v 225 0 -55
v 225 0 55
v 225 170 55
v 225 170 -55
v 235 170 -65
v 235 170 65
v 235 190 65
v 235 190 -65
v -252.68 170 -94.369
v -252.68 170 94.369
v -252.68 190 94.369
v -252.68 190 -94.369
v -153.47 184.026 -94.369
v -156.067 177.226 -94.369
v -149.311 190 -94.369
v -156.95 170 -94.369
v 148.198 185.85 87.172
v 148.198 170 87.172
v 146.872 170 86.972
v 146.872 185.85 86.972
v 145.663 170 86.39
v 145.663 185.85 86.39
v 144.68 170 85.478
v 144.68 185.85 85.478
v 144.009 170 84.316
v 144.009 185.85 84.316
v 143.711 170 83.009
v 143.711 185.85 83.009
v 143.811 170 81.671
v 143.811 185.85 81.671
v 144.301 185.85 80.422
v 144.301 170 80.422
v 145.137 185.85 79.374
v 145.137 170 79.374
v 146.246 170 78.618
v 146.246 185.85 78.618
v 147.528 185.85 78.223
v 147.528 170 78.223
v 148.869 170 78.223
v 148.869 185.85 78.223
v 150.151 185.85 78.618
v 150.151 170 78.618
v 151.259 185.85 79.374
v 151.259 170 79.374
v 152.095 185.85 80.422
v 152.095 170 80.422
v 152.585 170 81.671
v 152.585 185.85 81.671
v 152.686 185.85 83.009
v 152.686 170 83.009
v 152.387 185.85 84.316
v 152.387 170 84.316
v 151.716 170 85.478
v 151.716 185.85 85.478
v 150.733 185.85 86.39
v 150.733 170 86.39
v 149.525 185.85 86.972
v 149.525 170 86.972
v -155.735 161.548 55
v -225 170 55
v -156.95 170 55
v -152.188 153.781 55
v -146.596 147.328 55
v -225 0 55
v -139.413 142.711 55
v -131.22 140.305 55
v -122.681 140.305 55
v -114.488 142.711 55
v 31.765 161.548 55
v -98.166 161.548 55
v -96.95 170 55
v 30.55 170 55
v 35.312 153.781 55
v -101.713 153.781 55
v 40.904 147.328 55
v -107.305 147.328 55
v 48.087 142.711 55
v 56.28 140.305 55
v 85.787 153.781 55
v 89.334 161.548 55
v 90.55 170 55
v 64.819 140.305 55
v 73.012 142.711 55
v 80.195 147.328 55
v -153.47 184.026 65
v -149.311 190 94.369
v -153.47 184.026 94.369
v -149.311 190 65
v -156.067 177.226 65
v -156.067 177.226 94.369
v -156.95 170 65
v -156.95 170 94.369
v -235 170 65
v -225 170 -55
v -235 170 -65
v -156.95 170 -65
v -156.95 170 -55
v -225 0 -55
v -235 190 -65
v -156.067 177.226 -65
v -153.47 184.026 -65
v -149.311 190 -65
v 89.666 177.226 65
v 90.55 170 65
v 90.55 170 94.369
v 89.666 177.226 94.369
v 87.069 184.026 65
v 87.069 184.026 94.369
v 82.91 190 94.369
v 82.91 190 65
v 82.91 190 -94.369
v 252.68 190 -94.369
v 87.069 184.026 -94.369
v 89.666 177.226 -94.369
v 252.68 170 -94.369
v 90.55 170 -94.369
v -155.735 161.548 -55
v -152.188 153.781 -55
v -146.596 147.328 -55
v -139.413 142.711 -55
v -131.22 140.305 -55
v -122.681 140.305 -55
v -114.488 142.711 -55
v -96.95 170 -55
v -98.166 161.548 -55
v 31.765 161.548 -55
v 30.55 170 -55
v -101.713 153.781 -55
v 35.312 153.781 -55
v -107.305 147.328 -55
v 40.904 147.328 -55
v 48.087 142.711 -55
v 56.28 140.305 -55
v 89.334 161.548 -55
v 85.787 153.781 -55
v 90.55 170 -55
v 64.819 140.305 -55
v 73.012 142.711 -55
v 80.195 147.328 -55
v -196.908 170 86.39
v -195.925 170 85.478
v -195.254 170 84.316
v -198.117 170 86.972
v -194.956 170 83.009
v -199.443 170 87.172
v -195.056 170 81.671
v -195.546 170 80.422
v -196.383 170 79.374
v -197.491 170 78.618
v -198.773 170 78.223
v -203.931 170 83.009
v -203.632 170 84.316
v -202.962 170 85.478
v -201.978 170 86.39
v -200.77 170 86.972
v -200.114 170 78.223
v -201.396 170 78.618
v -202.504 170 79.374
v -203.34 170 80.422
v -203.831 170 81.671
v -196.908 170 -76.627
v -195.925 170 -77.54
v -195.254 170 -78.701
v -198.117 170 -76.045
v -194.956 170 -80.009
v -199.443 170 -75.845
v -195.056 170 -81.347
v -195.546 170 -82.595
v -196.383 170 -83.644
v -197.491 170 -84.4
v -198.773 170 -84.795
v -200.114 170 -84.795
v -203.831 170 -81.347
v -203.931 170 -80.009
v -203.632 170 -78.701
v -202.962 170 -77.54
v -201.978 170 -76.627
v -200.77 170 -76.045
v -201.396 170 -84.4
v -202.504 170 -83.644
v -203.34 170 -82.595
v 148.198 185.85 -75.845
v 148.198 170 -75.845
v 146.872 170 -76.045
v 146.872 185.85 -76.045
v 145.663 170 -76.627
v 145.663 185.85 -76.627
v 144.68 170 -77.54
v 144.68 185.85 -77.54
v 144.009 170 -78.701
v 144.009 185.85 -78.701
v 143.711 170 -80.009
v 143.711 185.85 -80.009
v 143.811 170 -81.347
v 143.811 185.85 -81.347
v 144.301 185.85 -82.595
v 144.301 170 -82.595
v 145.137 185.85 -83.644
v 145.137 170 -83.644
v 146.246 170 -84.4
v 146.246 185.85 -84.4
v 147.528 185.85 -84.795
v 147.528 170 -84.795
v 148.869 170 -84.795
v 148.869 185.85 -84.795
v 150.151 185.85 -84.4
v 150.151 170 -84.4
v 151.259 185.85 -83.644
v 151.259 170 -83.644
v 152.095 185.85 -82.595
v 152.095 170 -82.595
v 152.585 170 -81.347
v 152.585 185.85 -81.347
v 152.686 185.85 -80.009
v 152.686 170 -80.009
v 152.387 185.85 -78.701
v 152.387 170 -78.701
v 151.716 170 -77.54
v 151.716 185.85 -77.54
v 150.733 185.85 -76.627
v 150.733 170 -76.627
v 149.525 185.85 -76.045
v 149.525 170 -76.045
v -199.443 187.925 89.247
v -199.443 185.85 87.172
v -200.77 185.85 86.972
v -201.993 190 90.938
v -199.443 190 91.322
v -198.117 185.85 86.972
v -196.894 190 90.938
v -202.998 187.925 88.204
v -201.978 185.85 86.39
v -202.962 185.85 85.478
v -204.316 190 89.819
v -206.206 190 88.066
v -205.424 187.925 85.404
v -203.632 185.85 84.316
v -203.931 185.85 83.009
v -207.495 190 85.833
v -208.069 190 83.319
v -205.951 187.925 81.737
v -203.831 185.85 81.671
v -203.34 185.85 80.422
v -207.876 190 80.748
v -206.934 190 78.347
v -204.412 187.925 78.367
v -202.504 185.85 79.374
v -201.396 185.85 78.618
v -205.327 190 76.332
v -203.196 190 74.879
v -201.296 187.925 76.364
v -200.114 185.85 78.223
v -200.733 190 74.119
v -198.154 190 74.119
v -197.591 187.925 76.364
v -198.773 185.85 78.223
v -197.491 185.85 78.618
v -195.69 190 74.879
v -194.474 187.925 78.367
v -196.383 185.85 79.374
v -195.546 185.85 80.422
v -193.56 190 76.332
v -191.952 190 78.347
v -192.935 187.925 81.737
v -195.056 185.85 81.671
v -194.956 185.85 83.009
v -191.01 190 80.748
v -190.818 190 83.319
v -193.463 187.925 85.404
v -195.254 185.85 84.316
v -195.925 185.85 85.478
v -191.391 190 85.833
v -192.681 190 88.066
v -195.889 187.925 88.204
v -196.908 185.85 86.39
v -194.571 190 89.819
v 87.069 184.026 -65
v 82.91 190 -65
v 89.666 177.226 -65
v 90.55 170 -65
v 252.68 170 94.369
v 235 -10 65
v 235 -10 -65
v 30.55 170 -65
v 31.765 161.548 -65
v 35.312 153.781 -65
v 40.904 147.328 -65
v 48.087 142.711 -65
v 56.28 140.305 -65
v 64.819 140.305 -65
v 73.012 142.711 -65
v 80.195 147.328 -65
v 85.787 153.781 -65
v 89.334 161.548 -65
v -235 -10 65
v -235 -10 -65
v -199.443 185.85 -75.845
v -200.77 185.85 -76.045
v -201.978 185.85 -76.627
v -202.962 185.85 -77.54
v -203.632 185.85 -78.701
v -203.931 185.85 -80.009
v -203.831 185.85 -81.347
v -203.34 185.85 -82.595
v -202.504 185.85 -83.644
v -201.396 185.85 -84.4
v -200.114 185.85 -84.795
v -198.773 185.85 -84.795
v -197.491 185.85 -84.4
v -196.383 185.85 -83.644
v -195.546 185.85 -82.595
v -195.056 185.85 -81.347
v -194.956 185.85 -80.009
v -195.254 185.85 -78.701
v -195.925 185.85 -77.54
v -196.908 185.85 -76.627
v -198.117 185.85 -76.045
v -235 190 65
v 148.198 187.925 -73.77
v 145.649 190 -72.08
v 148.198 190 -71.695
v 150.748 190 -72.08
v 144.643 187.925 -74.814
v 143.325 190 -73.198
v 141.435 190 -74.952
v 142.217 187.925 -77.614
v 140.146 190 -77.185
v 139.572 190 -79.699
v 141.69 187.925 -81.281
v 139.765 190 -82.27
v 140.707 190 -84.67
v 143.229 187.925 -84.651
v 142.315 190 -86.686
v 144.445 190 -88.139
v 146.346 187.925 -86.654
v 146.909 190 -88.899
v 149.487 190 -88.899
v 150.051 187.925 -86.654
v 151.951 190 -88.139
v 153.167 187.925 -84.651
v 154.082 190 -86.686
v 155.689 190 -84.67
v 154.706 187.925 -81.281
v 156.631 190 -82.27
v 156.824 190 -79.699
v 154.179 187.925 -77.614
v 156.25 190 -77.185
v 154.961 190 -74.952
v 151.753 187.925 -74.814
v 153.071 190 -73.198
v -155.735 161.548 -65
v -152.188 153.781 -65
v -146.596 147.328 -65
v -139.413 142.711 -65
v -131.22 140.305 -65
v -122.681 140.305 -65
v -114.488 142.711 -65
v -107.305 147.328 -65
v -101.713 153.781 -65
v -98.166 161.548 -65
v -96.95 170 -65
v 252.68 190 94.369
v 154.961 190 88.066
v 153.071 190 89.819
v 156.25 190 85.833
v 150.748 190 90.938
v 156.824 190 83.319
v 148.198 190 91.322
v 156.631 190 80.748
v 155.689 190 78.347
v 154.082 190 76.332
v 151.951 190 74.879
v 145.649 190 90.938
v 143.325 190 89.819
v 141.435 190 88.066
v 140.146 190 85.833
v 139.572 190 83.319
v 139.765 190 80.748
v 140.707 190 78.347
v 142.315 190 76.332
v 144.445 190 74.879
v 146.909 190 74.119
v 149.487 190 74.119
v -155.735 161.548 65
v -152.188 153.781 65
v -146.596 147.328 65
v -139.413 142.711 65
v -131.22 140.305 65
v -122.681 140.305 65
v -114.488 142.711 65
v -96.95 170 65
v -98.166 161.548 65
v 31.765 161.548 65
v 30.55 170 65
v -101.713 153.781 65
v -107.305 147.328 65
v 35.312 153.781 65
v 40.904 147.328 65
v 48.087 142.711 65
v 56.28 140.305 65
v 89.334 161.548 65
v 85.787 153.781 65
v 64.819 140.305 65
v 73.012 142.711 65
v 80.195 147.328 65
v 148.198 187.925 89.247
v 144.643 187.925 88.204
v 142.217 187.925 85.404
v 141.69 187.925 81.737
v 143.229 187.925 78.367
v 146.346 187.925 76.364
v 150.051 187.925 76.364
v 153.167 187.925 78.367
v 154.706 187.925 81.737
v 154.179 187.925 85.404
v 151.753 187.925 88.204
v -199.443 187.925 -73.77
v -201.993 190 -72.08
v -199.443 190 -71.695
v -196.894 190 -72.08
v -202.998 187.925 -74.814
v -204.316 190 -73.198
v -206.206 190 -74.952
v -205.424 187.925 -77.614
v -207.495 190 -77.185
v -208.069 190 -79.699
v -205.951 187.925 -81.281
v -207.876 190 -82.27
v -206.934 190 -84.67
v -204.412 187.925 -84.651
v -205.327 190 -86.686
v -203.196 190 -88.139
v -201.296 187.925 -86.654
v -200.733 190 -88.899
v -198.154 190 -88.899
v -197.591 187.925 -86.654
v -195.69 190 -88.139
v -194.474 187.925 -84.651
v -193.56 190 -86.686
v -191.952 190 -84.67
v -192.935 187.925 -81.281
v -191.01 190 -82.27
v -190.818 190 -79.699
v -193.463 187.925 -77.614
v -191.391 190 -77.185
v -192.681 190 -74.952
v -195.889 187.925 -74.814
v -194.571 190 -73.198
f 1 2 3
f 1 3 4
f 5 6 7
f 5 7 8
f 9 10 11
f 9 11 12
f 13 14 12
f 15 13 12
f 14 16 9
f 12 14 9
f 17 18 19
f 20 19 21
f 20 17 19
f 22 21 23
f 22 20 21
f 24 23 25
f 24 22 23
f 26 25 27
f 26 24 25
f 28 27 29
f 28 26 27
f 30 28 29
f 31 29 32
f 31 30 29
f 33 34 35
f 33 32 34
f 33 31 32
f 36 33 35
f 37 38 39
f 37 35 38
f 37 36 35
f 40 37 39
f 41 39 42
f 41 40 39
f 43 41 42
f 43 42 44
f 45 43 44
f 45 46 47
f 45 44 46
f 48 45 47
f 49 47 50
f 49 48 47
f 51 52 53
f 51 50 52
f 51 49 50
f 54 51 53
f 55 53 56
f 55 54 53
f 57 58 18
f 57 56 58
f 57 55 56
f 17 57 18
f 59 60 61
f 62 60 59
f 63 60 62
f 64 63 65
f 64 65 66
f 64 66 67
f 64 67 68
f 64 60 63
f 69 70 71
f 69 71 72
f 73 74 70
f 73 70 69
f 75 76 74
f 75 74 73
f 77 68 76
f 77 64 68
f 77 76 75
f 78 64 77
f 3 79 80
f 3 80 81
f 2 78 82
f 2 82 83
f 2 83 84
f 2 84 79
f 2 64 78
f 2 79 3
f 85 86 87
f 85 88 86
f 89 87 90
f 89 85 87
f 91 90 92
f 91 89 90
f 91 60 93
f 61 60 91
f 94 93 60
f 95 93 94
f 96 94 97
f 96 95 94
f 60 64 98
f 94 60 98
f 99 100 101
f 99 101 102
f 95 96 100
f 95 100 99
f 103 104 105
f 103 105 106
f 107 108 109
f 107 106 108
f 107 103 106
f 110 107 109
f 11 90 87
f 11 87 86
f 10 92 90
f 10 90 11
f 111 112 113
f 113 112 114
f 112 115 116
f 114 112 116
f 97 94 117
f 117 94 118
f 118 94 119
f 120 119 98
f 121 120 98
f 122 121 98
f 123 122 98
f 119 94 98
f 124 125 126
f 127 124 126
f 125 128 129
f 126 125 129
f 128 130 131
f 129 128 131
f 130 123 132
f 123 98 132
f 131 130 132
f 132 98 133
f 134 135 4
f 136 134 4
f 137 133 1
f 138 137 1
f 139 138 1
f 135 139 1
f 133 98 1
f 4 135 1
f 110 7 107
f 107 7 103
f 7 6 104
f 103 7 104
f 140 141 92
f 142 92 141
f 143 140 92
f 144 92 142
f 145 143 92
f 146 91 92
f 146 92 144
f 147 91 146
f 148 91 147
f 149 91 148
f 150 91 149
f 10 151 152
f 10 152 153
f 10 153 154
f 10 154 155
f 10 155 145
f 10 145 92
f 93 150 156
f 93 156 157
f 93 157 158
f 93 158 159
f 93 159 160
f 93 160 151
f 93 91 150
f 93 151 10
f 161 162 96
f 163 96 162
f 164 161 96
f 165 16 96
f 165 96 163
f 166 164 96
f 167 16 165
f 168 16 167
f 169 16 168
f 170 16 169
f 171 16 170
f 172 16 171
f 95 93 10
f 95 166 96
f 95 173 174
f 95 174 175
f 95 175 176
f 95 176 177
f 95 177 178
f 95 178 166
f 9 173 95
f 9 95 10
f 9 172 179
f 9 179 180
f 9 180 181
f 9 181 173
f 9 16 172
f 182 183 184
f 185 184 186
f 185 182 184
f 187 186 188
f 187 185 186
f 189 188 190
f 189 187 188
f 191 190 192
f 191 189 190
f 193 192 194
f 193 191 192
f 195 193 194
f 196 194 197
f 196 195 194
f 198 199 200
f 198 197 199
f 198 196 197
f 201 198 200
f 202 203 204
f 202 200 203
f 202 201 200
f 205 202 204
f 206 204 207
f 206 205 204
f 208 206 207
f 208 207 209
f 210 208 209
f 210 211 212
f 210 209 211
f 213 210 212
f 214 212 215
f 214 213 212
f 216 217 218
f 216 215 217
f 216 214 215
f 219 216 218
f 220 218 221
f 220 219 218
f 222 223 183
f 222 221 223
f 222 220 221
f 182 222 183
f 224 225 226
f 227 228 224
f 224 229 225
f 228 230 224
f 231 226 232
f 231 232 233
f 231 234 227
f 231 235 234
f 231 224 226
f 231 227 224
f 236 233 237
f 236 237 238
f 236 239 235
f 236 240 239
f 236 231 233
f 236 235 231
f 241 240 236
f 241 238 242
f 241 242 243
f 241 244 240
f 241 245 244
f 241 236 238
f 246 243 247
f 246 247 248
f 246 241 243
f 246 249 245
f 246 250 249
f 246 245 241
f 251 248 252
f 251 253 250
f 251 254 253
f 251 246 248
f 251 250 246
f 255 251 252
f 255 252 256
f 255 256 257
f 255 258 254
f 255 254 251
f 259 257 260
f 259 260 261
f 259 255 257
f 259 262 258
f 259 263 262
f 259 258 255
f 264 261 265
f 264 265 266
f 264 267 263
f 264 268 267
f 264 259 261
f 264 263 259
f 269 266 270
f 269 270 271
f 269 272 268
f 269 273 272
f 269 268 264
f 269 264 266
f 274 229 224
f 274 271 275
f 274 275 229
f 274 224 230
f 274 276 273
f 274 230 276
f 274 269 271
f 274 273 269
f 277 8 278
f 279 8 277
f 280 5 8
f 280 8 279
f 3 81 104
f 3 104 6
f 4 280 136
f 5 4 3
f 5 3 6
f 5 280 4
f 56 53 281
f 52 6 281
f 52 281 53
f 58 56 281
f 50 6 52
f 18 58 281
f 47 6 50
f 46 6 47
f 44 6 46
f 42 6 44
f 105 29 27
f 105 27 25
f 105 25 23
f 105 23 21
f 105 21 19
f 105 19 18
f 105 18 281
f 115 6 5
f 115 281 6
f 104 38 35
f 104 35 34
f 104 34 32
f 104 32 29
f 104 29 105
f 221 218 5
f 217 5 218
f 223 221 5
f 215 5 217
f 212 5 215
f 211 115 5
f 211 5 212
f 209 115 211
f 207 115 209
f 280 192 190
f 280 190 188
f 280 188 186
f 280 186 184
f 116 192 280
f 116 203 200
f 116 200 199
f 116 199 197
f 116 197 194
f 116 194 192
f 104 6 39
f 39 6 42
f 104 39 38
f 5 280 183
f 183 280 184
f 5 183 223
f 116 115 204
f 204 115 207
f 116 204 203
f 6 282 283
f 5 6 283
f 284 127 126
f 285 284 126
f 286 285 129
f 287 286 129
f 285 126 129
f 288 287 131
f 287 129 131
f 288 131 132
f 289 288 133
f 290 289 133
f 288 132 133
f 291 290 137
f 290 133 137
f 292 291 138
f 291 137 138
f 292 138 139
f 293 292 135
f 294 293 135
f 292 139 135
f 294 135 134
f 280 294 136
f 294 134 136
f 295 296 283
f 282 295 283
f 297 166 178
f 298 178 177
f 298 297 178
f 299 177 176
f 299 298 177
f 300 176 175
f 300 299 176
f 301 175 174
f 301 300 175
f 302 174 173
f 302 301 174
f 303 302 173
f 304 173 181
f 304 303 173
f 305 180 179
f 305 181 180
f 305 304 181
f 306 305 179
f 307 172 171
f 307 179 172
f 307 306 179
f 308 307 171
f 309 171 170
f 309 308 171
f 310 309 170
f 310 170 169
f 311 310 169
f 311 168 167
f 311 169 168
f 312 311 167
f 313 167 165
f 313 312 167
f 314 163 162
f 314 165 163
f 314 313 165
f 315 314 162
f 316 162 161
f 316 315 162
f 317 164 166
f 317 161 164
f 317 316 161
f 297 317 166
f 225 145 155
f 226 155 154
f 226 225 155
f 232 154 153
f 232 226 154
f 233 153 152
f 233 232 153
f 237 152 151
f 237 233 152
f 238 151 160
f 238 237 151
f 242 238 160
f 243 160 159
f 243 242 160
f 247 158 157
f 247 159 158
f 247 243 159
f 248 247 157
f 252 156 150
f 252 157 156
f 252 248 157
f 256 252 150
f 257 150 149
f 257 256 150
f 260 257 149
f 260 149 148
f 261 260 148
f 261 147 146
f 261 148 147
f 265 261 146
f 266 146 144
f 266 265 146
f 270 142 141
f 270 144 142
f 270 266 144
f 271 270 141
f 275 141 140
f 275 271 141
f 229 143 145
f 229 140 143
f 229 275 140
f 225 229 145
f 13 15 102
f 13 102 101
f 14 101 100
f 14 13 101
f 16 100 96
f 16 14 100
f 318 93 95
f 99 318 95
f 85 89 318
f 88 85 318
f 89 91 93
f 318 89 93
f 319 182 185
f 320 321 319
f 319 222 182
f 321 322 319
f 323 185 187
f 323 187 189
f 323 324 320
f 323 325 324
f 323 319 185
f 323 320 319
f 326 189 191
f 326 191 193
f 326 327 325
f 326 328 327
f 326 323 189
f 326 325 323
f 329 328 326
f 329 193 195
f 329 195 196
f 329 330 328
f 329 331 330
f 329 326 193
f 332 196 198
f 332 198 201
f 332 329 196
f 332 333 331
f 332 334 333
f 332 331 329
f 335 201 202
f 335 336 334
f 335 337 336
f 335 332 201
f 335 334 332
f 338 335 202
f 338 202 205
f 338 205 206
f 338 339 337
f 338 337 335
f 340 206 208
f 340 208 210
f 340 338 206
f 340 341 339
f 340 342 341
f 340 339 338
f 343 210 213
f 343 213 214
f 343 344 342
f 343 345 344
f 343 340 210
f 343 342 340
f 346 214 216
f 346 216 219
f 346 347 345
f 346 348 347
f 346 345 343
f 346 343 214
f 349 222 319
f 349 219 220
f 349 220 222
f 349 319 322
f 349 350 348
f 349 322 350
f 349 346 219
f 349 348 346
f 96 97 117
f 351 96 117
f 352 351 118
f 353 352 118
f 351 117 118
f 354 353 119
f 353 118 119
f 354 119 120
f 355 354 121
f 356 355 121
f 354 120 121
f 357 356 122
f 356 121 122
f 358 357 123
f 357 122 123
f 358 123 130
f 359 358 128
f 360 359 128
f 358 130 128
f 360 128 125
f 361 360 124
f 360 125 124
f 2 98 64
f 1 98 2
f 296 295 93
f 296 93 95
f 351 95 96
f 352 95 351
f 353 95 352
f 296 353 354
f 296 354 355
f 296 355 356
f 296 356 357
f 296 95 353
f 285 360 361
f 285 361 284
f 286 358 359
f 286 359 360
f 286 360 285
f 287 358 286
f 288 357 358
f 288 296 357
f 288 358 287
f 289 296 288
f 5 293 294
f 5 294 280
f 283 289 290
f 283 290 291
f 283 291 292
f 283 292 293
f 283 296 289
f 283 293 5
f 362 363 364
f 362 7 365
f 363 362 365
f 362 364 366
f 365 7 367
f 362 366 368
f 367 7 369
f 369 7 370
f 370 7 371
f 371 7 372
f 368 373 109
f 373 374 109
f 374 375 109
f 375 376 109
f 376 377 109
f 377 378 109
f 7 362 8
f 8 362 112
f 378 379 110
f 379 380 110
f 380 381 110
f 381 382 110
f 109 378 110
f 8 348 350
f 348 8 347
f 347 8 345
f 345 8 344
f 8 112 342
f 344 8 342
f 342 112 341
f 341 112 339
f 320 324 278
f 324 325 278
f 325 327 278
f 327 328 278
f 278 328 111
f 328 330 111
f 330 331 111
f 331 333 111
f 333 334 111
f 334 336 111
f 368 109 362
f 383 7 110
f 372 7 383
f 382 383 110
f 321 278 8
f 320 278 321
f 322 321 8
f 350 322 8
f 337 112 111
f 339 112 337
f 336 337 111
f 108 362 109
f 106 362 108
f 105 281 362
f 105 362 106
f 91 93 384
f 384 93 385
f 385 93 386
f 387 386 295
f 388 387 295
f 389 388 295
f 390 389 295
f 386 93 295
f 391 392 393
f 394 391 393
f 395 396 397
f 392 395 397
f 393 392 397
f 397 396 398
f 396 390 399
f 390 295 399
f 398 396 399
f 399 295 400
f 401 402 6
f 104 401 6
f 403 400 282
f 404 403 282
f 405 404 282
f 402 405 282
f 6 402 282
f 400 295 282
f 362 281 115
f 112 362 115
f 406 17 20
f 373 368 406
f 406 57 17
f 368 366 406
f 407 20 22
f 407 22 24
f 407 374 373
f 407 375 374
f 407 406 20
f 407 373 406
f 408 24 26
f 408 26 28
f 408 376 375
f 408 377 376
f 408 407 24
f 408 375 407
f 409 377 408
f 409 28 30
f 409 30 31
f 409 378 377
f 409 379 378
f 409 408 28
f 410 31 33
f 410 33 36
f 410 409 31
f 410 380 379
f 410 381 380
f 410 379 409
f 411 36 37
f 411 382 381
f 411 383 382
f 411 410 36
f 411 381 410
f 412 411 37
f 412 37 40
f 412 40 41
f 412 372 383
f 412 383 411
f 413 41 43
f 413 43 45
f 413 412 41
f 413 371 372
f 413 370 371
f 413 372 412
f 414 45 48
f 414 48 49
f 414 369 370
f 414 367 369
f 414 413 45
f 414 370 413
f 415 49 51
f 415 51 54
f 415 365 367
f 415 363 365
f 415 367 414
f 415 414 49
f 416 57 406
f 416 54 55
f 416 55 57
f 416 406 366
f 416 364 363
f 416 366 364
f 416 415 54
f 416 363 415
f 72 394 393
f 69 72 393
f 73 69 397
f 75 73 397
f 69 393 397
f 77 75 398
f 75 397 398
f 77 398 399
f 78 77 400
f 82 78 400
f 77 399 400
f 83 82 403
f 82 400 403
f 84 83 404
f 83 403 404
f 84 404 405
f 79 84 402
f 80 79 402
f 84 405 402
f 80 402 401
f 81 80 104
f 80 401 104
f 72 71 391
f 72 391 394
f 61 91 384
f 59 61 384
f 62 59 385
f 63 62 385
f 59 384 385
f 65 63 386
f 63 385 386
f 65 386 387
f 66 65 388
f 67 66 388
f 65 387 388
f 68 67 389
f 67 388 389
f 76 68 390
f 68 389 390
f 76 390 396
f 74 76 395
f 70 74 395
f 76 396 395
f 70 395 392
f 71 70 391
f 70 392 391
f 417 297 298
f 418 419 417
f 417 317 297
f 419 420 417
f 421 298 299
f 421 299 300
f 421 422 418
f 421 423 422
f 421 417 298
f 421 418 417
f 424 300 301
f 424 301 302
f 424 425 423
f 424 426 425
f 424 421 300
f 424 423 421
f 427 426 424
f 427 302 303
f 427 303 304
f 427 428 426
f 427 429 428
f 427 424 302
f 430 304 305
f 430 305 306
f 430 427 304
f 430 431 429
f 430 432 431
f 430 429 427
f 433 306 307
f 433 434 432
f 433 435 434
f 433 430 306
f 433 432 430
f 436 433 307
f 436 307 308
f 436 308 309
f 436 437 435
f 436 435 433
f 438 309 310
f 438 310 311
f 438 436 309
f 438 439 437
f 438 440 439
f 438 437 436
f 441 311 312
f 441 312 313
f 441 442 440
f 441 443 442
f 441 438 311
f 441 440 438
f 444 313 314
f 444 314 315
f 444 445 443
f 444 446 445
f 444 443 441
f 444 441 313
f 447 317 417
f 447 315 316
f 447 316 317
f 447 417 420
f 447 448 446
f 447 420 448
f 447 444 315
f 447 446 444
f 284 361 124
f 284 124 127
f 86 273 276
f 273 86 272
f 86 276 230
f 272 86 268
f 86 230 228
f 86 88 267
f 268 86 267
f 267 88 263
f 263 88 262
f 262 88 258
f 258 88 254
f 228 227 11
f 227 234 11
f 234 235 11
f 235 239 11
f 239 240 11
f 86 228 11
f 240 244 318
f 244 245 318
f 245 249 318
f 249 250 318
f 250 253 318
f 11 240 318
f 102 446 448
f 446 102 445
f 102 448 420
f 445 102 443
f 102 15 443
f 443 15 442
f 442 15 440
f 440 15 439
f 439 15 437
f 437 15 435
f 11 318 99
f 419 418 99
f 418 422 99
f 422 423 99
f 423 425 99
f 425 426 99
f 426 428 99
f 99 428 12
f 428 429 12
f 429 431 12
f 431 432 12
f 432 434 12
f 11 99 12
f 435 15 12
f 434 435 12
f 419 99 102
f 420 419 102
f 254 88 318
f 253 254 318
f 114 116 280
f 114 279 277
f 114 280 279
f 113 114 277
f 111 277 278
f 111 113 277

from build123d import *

# Parameters (mm, degrees)
SKETCH1_W                                    = 450
SKETCH1_H                                    = 110
BOSS_EXTRUDE1_DEPTH                          = 170
SHELL1_T                                     = 10
SKETCH2_R                                    = 30
CUT_EXTRUDE1_DEPTH                           = 250
SKETCH4_W                                    = 505.360173326
SKETCH4_H                                    = 188.738784552
SKETCH4_W_2                                  = 470
SKETCH4_H_2                                  = 130
BOSS_EXTRUDE3_DEPTH                          = 20
CUT_EXTRUDE4_DEPTH                           = 75
CUT_EXTRUDE4_DEPTH_BACK                      = 265
SKETCH2_4_R                                  = 30
CSK_FOR_M8_COUNTERSUNK_FLAT_HEAD_SCR_2_COUNT = 2
CSK_FOR_M8_COUNTERSUNK_FLAT_HEAD_SCR_2_PITCH = 163.017631271
CSK_FOR_M8_COUNTERSUNK_FLAT_HEAD_SCR_3_COUNT = 2
CSK_FOR_M8_COUNTERSUNK_FLAT_HEAD_SCR_3_PITCH = 347.641564167
CSK_FOR_M8_COUNTERSUNK_FLAT_HEAD_SCR_4_COUNT = 2
CSK_FOR_M8_COUNTERSUNK_FLAT_HEAD_SCR_4_PITCH = 383.965369847


with BuildPart() as part:
    # Sketch1 → Boss-Extrude1 (new body)
    with BuildSketch(Plane(origin=(0, 0, 0), x_dir=(1, 0, 0), z_dir=(0, 1, 0))):
        Rectangle(SKETCH1_W, SKETCH1_H)
    extrude(amount=BOSS_EXTRUDE1_DEPTH)

    # Shell1
    shell1_openings = [part.faces().sort_by_distance(p)[0] for p in [
        (0, 170, 0),
    ]]
    offset(amount=SHELL1_T, openings=shell1_openings, kind=Kind.INTERSECTION)

    # Sketch2 → Cut-Extrude1 (cut)
    with BuildSketch(Plane.XY.offset(65)):
        with Locations((-126.950391401, 170)):
            Circle(SKETCH2_R)
        with Locations((60.549608599, 170)):
            Circle(SKETCH2_R)
    extrude(amount=-CUT_EXTRUDE1_DEPTH, mode=Mode.SUBTRACT)


with BuildPart() as body_2:
    # Sketch4 → Boss-Extrude3 (new body)
    with BuildSketch(Plane(origin=(0, 170, 0), x_dir=(-1, 0, 0), z_dir=(0, -1, 0))):
        Rectangle(SKETCH4_W, SKETCH4_H)
        Rectangle(SKETCH4_W_2, SKETCH4_H_2, mode=Mode.SUBTRACT)
    extrude(amount=-BOSS_EXTRUDE3_DEPTH)

    # Sketch2<4> → Cut-Extrude4 (cut, two sides: drawn at the far end of the back side and taken through both)
    with BuildSketch(Plane.XY.offset(65).offset(-CUT_EXTRUDE4_DEPTH_BACK)):
        with Locations((-126.950391401, 170)):
            Circle(SKETCH2_4_R)
        with Locations((60.549608599, 170)):
            Circle(SKETCH2_4_R)
    extrude(amount=CUT_EXTRUDE4_DEPTH + CUT_EXTRUDE4_DEPTH_BACK, mode=Mode.SUBTRACT)


with BuildPart() as cut_extrude4_piece_1:
    # of the separate pieces the step leaves, piece 1, a body of its own (cut_extrude4_pieces_kept)
    add(body_2.part.solids().sort_by_distance((90.549608599, 170, -94.369392276))[0])


with BuildPart() as cut_extrude4_piece_2:
    # of the separate pieces the step leaves, piece 2, a body of its own (cut_extrude4_pieces_kept)
    add(body_2.part.solids().sort_by_distance((-252.680086663, 170, -94.369392276))[0])

    # Sketch7 → CSK for M8 Countersunk Flat Head Screw1 (revolve, cut)
    with BuildSketch(Plane(origin=(-199.443365859, 190, -80.345227372), x_dir=(0, 0, 1), z_dir=(1, 0, 0))):
        Polygon((0, 0), (0, 200), (4.5, 200), (4.5, 4.15), (8.65, 0), align=None)
    csk_for_m8_countersunk_flat_head_screw1 = revolve(axis=Axis((-199.443365859, 196.35, -80.345227372), (0, -1, 0)), mode=Mode.SUBTRACT)

    # CSK for M8 Countersunk Flat Head Scr 2: CSK for M8 Countersunk Flat Head Screw1 ×2
    with Locations(*[(0, 0, i * CSK_FOR_M8_COUNTERSUNK_FLAT_HEAD_SCR_2_PITCH) for i in range(1, CSK_FOR_M8_COUNTERSUNK_FLAT_HEAD_SCR_2_COUNT)]):
        add(csk_for_m8_countersunk_flat_head_screw1, mode=Mode.SUBTRACT)


with BuildPart() as cut_extrude4_piece_1_1:
    add(cut_extrude4_piece_1.part)

    # CSK for M8 Countersunk Flat Head Scr 3: CSK for M8 Countersunk Flat Head Screw1 ×2
    with Locations(*[(i * CSK_FOR_M8_COUNTERSUNK_FLAT_HEAD_SCR_3_PITCH, 0, 0) for i in range(1, CSK_FOR_M8_COUNTERSUNK_FLAT_HEAD_SCR_3_COUNT)]):
        add(csk_for_m8_countersunk_flat_head_screw1, mode=Mode.SUBTRACT)

    # CSK for M8 Countersunk Flat Head Scr 4: CSK for M8 Countersunk Flat Head Screw1 ×2
    with Locations(*[Vector(0.9053982245993311, 0, 0.42456336970160213) * (i * CSK_FOR_M8_COUNTERSUNK_FLAT_HEAD_SCR_4_PITCH) for i in range(1, CSK_FOR_M8_COUNTERSUNK_FLAT_HEAD_SCR_4_COUNT)]):
        add(csk_for_m8_countersunk_flat_head_screw1, mode=Mode.SUBTRACT)


solid = Compound([part.part, cut_extrude4_piece_2.part, cut_extrude4_piece_1_1.part])
